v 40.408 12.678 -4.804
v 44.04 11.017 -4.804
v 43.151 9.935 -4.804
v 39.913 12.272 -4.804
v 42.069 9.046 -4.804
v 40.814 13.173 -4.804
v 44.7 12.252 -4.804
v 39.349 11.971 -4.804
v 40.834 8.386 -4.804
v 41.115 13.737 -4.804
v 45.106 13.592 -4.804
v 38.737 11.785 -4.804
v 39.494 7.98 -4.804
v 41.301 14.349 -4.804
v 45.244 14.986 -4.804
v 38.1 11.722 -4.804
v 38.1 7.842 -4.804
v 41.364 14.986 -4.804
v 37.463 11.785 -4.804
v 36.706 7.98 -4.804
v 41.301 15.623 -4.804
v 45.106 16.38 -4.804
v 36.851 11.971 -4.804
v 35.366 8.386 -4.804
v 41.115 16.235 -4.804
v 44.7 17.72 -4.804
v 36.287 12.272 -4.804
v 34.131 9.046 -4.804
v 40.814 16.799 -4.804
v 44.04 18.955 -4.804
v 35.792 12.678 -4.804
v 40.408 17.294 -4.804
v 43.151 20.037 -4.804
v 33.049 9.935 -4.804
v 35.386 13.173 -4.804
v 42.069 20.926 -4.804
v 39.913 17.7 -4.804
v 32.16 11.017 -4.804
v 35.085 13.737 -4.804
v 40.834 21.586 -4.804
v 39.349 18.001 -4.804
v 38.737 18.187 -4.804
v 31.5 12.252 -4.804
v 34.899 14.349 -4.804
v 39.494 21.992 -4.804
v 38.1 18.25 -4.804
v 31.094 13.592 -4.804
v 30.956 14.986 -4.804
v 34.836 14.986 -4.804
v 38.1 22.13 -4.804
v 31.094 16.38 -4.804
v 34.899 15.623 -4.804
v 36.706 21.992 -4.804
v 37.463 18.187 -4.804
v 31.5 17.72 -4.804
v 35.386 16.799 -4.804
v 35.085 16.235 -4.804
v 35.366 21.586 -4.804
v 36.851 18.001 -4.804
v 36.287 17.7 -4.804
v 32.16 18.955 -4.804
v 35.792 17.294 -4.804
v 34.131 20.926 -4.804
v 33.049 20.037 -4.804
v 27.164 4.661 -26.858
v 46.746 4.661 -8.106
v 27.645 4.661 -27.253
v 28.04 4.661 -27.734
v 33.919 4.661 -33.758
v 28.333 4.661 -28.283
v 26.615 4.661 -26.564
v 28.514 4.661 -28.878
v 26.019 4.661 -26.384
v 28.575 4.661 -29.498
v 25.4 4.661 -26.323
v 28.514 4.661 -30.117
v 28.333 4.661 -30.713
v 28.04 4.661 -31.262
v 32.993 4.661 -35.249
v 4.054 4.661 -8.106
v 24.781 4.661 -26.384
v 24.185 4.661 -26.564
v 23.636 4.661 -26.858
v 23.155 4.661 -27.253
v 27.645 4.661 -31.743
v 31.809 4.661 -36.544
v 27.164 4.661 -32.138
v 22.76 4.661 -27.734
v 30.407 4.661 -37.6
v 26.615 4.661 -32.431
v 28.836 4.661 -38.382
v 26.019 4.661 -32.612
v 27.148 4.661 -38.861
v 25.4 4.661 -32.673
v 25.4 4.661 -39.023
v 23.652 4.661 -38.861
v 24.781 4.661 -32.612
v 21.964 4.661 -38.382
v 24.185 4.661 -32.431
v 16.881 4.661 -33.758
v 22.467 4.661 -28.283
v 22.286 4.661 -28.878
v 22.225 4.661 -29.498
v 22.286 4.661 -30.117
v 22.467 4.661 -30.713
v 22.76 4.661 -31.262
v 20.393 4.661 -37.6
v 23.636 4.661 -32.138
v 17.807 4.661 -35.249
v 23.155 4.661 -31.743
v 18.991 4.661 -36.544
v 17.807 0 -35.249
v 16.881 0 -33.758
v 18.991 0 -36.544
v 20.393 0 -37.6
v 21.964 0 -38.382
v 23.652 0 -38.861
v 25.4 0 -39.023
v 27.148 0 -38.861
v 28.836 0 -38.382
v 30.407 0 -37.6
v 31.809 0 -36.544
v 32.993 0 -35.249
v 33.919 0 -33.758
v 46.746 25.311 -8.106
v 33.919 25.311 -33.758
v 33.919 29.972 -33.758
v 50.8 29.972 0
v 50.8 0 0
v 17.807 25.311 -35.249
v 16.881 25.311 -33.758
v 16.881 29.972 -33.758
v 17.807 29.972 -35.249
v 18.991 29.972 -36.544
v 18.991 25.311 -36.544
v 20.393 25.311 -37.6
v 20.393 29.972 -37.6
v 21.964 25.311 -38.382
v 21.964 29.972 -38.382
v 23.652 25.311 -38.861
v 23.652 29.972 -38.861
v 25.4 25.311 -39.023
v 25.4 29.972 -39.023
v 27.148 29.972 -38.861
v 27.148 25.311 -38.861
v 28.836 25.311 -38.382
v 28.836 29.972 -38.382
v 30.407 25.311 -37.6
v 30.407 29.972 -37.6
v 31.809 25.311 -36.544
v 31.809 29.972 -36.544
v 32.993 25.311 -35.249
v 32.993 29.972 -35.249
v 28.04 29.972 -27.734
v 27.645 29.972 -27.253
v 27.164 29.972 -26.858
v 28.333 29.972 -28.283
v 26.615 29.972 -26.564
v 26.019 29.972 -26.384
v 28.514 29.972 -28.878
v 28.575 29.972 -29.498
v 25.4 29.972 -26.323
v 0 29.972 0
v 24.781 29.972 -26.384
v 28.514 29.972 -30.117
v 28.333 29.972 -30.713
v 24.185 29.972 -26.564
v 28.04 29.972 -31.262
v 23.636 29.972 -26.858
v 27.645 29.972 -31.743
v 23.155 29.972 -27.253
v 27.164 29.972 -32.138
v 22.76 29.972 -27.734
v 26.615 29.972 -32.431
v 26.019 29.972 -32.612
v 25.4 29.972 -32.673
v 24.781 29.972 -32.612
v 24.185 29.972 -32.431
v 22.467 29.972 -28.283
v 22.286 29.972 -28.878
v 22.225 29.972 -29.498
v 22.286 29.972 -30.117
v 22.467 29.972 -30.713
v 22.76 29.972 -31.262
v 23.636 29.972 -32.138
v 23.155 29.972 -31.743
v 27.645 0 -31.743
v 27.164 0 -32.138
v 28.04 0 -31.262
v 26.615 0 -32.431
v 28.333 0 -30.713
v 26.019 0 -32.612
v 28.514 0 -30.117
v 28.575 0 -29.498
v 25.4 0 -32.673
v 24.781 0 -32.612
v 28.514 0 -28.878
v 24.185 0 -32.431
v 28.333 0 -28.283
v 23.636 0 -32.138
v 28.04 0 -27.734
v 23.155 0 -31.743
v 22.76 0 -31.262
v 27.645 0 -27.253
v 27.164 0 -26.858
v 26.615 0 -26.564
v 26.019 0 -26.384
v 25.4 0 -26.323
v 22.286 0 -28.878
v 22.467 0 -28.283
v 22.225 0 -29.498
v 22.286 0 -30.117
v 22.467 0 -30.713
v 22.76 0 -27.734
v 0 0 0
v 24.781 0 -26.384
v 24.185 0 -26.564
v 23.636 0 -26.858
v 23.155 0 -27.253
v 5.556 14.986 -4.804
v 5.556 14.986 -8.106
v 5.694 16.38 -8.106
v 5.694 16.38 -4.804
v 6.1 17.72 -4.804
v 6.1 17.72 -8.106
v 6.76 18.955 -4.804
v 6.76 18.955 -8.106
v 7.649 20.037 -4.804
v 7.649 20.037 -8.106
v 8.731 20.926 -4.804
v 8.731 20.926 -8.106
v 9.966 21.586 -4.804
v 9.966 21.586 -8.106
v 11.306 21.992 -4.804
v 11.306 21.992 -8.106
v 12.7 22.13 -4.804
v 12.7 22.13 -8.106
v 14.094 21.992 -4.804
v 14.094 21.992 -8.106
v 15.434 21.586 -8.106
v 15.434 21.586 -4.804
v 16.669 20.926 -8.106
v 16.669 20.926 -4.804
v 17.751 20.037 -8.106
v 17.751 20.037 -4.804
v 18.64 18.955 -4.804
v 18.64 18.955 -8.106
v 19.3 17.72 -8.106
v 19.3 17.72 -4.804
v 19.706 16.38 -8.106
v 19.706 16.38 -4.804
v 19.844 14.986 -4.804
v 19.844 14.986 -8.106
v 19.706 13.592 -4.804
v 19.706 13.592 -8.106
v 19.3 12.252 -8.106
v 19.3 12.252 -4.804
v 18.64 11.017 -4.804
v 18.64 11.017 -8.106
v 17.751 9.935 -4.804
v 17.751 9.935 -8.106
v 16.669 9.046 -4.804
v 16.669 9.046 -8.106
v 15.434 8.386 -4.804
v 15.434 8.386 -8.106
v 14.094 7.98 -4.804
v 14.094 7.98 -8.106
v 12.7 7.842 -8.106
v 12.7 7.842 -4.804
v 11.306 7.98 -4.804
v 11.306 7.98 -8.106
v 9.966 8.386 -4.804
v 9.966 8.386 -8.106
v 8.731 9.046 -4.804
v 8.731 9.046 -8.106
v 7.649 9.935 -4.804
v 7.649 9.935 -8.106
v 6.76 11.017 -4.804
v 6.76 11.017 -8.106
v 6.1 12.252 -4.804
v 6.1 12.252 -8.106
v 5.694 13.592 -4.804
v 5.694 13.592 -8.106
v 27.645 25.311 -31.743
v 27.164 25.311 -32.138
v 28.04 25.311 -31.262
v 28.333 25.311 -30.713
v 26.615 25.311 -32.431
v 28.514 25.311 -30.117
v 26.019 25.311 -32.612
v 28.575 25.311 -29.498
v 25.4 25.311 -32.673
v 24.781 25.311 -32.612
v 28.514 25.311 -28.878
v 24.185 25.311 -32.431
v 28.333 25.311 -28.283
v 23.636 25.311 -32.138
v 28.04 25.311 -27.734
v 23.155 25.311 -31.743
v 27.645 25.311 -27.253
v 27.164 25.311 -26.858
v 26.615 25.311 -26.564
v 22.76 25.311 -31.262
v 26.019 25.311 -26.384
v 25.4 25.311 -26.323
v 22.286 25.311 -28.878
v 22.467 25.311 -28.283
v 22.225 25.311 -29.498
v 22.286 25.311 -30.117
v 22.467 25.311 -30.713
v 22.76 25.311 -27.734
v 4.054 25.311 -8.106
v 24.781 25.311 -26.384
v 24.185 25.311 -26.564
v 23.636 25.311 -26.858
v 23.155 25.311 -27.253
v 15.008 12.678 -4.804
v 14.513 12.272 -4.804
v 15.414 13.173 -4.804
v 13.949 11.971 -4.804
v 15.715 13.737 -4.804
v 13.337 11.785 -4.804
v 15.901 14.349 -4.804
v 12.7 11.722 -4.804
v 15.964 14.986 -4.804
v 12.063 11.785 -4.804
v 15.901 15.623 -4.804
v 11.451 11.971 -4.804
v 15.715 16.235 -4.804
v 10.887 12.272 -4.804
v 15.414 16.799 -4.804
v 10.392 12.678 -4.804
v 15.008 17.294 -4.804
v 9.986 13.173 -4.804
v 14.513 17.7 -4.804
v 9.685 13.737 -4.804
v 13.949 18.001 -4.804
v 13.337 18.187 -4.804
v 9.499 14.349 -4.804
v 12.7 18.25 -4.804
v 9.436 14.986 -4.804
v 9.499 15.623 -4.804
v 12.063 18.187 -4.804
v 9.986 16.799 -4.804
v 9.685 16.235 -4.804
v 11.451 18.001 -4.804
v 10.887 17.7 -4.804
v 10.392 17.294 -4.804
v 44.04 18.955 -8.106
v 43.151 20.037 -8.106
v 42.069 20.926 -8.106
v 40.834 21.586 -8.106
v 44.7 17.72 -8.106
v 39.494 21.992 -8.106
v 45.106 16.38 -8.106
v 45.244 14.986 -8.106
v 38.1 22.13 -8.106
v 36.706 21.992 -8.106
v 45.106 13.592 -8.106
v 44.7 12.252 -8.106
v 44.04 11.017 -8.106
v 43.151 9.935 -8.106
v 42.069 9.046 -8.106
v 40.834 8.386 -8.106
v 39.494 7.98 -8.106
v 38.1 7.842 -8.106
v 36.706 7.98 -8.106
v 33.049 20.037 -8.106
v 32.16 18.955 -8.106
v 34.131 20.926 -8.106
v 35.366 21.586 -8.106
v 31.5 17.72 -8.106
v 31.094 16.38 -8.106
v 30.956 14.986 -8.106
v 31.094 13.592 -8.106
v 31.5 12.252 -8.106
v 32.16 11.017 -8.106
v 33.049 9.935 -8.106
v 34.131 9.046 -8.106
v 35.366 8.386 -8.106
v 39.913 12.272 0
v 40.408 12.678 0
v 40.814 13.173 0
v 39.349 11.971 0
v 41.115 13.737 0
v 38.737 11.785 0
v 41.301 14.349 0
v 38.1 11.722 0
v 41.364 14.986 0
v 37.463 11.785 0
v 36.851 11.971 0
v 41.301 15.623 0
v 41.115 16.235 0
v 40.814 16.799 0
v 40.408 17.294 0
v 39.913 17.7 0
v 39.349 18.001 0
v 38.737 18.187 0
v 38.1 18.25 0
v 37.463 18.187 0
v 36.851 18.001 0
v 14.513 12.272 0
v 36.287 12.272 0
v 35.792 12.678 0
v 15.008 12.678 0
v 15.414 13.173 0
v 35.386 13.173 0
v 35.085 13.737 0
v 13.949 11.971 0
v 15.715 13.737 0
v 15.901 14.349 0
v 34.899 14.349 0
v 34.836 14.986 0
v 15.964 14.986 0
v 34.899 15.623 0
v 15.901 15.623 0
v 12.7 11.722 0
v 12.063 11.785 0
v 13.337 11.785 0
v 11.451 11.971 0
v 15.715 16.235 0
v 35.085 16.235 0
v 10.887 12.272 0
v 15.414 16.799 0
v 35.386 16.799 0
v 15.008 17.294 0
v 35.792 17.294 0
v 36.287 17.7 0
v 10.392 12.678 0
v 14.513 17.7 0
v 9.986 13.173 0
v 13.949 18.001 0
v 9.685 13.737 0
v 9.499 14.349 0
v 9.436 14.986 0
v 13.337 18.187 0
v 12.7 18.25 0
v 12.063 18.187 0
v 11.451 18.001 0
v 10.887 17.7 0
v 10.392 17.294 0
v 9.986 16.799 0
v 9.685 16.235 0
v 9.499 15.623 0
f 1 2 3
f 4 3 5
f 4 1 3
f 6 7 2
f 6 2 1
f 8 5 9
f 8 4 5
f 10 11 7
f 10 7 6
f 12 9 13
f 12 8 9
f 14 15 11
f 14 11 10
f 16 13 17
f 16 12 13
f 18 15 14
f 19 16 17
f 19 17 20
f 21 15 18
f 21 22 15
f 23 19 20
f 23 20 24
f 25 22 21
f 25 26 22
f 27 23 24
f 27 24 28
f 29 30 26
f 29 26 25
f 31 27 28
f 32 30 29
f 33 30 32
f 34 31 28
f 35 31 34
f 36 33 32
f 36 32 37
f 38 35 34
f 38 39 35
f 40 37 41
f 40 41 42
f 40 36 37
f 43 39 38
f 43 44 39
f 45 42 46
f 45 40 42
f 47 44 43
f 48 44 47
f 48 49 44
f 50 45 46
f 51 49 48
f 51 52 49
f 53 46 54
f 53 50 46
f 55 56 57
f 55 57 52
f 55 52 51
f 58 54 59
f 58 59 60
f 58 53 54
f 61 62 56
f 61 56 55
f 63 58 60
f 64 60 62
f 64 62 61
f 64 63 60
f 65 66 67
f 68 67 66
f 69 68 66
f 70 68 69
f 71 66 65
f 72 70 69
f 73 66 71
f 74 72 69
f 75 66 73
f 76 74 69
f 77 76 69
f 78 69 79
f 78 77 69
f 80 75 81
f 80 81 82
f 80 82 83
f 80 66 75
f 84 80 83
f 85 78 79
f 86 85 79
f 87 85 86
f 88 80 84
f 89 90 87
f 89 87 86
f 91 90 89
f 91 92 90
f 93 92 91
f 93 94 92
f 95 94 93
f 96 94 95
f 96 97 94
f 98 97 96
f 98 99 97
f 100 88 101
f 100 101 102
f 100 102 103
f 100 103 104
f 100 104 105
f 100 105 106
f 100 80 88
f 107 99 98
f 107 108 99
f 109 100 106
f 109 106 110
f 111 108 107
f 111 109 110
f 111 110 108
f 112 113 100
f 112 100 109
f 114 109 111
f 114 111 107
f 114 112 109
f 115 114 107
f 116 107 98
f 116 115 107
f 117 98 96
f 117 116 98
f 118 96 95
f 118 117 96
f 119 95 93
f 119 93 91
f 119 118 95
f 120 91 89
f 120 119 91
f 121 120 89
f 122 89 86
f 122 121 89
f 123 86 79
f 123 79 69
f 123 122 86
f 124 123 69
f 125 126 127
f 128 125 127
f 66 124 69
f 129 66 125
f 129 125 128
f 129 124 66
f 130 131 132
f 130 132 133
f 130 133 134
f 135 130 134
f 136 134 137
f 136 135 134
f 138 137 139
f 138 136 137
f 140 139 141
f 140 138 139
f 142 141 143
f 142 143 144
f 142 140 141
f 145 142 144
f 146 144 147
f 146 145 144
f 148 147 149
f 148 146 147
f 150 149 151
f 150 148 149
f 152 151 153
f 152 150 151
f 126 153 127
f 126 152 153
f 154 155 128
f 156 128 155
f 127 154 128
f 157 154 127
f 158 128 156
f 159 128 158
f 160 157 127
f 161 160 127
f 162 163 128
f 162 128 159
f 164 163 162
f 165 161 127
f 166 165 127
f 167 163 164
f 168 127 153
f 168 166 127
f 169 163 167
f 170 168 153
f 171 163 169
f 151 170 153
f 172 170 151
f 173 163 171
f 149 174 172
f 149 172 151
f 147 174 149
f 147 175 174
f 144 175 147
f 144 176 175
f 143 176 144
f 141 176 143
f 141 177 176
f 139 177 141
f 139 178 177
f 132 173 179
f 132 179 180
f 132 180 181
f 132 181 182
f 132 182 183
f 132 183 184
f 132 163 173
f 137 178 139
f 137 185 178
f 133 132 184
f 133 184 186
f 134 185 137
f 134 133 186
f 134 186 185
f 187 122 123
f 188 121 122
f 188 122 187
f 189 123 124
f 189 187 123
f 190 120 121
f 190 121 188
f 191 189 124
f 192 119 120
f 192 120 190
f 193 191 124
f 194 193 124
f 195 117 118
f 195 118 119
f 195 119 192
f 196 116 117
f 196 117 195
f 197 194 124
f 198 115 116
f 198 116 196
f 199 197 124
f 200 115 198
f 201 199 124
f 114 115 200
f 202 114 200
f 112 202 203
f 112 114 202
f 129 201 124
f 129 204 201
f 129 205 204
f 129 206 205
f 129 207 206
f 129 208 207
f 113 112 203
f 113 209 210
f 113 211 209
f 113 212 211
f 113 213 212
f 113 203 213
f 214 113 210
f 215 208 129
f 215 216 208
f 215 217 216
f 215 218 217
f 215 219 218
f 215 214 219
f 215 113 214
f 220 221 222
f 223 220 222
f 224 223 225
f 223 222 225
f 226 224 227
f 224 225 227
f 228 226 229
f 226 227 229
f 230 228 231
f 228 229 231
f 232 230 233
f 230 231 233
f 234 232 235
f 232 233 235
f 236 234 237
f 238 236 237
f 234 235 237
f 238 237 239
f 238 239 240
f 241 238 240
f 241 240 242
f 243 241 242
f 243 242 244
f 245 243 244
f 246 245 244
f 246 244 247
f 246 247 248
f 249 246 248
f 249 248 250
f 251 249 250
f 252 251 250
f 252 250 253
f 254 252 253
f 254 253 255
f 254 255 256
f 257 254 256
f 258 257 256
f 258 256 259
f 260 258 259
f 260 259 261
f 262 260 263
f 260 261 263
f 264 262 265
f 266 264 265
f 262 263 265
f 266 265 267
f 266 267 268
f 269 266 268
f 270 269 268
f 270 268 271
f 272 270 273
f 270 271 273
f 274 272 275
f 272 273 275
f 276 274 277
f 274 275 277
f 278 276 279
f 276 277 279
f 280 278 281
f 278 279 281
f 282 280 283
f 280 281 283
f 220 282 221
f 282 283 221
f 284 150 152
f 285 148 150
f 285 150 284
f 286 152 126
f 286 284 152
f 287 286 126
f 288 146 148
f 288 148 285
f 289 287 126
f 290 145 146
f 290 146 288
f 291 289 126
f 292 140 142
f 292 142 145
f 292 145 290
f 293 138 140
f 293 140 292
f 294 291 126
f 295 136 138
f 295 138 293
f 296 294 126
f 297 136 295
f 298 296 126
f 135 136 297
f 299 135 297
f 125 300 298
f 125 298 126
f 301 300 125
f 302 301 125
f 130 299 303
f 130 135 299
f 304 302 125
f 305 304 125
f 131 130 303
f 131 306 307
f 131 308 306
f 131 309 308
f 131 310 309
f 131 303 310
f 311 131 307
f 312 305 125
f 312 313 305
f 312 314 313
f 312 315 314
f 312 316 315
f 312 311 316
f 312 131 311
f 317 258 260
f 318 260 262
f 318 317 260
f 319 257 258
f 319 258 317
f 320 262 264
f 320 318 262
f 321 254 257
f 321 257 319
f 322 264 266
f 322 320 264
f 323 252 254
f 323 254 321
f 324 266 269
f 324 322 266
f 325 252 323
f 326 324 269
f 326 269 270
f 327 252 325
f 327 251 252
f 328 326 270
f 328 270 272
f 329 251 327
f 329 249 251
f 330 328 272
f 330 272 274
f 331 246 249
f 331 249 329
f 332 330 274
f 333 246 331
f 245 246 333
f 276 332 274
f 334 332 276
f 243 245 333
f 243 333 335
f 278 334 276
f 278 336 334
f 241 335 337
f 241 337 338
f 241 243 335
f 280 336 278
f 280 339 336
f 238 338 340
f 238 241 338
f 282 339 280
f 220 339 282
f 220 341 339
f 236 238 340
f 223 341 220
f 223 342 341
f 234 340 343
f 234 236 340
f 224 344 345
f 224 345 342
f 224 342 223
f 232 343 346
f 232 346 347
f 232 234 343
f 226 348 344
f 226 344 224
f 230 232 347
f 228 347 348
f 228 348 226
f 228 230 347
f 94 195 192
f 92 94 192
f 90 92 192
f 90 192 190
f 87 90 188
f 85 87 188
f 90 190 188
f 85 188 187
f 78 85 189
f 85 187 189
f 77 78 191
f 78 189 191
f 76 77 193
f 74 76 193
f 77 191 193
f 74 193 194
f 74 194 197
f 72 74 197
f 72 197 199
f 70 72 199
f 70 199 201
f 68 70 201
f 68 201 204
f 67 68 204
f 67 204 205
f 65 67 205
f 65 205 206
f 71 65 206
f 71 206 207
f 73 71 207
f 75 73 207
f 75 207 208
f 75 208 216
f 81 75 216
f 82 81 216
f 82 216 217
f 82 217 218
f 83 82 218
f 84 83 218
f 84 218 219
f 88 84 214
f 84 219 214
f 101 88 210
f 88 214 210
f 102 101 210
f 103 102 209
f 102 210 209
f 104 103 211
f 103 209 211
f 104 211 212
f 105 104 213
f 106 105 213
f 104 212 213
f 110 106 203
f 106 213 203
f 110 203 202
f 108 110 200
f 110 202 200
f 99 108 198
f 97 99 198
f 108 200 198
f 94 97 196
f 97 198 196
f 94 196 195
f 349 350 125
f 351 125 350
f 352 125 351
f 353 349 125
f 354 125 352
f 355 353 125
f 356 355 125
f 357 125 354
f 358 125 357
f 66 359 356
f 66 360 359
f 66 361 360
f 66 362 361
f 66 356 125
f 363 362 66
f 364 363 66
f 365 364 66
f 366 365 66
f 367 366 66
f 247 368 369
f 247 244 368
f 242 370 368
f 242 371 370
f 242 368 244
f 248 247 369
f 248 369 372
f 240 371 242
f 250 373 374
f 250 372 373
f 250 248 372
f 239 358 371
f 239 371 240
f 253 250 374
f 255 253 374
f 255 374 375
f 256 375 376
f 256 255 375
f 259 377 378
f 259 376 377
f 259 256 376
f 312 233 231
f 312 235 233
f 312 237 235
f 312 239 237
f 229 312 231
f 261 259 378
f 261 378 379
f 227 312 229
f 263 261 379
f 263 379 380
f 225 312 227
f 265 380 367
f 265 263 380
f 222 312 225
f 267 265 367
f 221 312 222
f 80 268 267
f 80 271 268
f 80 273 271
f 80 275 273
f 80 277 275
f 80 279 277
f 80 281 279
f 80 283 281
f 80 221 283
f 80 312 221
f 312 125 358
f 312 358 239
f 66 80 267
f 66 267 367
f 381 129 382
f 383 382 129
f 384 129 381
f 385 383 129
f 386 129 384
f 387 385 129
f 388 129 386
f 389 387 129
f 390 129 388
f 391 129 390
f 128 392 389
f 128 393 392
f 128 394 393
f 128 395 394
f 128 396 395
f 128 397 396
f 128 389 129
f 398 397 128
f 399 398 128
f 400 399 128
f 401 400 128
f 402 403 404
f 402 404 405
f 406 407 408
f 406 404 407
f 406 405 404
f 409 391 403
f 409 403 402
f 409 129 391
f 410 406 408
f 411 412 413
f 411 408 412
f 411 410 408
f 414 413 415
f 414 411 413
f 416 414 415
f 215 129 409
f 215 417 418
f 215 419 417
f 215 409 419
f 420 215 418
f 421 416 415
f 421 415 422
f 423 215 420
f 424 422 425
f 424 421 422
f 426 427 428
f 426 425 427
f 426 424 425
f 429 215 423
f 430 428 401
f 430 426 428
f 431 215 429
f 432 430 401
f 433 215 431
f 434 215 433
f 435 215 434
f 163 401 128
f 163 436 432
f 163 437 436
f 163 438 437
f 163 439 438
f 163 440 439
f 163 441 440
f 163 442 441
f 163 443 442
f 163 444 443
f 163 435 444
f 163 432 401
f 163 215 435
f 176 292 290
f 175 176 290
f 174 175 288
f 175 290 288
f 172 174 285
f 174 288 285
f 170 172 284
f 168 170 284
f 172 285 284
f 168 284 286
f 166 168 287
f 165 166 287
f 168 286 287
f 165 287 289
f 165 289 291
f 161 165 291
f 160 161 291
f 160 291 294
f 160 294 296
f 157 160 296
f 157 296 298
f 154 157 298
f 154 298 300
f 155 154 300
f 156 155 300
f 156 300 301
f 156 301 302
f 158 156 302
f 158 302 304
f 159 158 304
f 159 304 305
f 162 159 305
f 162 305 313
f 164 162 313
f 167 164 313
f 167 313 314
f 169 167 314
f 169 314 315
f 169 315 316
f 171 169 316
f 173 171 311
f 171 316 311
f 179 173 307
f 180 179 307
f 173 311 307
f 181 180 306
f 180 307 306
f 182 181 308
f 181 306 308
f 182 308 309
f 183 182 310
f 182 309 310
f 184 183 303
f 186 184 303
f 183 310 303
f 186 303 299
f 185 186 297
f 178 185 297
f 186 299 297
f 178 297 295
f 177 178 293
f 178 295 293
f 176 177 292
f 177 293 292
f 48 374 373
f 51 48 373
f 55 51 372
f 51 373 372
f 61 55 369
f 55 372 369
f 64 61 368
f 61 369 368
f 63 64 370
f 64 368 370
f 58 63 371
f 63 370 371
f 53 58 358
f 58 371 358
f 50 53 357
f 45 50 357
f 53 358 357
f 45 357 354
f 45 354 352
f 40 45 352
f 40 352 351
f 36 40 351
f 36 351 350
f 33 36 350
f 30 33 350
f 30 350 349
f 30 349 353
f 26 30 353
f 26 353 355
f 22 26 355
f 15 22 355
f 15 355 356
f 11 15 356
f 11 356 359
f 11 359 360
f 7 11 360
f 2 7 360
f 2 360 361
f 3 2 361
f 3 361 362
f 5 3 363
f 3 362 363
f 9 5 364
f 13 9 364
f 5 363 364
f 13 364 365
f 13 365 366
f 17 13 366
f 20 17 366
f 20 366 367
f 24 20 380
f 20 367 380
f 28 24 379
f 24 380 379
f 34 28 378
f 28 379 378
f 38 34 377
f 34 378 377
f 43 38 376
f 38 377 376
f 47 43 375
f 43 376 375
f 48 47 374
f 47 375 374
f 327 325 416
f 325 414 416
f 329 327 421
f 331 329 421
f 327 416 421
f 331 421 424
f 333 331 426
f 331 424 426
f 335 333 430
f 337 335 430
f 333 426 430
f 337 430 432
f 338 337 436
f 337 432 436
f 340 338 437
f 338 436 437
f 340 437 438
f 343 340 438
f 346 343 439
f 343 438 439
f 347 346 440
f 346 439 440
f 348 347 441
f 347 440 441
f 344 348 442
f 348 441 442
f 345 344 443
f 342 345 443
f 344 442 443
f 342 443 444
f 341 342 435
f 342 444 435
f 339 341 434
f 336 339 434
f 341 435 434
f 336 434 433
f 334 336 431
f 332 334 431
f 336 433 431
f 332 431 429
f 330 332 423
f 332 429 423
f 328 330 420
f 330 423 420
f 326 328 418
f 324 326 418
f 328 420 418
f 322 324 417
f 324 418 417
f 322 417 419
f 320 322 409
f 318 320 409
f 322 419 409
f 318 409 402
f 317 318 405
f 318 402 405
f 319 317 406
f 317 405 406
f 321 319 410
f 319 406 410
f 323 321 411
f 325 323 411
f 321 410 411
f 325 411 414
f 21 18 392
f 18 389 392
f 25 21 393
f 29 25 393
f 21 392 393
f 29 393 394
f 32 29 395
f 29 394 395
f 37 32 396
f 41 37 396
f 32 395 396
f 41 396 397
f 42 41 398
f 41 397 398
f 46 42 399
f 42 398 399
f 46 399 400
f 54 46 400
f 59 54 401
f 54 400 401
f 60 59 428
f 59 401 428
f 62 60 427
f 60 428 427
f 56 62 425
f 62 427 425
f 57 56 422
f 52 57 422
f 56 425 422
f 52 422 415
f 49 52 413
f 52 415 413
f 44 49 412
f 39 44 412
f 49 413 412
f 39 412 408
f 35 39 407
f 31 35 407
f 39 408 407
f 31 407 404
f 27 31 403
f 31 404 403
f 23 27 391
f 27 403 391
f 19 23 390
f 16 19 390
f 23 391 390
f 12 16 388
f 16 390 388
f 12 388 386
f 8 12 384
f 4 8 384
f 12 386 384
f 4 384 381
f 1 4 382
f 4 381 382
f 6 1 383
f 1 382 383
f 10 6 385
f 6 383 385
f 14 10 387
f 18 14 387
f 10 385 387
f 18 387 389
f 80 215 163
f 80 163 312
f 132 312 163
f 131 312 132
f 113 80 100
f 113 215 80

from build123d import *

# Parameters (mm, degrees)
BOSS_EXTRUDE1_DEPTH                                  = 50.8
CBORE_FOR_1_4_BINDING_HEAD_MACHINE_SCREW_D           = 6.5278
CBORE_FOR_1_4_BINDING_HEAD_MACHINE_SCREW_CBORE_D     = 14.2875
CBORE_FOR_1_4_BINDING_HEAD_MACHINE_SCREW_CBORE_DEPTH = 3.302
CUT_EXTRUDE1_REACH                                   = 73.186
SKETCH4_R                                            = 3.175


with BuildPart() as part:
    # Sketch1 → Boss-Extrude1 (new body)
    with BuildSketch(Plane(origin=(0, 0, 0), x_dir=(0, 0, -1), z_dir=(1, 0, 0))):
        Polygon((0, 0), (0, 29.972), (39.856315031, 29.972), (39.856315031, 25.3111), (8.106315031, 25.3111), (8.106315031, 4.6609), (39.856315031, 4.6609), (39.856315031, 0), align=None)
    extrude(amount=BOSS_EXTRUDE1_DEPTH)

    # CBORE for 1/4 Binding Head Machine Screw1 (through all)
    with Locations(Plane(origin=(0, 0, -8.106315031), x_dir=(-1, 0, 0), z_dir=(0, 0, -1))):
        with Locations((-12.7, 14.986), (-38.1, 14.986)):
            CounterBoreHole(CBORE_FOR_1_4_BINDING_HEAD_MACHINE_SCREW_D / 2, CBORE_FOR_1_4_BINDING_HEAD_MACHINE_SCREW_CBORE_D / 2, CBORE_FOR_1_4_BINDING_HEAD_MACHINE_SCREW_CBORE_DEPTH)

    # Cut-Extrude1: up to this face of the body (flat: up to its plane)
    cut_extrude1_end = Plane(part.part.faces().sort_by_distance((25.4, 29.972, -19.928157515))[0])
    # Sketch4 → Cut-Extrude1 (cut, up to the picked face)
    with BuildSketch(Plane.XZ, mode=Mode.PRIVATE) as cut_extrude1_sk1:
        with Locations(Location((25.4, -29.497789369, 0), (0, 0, 270))):
            Circle(SKETCH4_R)
    cut_extrude1_tool1 = split(extrude(cut_extrude1_sk1.sketch, amount=-CUT_EXTRUDE1_REACH, mode=Mode.PRIVATE), bisect_by=cut_extrude1_end, keep=Keep.BOTH, mode=Mode.PRIVATE)
    # Sketch4 → Cut-Extrude1 (cut, up to the picked face)
    with BuildSketch(Plane.XZ, mode=Mode.PRIVATE) as cut_extrude1_sk2:
        with BuildLine():
            Line((0, 0), (16.880765903, -33.757868641))
            ThreePointArc((16.880765903, -33.757868641), (25.4, -39.022789369), (33.919234097, -33.757868641))
            Line((33.919234097, -33.757868641), (50.8, 0))
            Line((50.8, 0), (50.8, -39.856315031))
            Line((50.8, -39.856315031), (0, -39.856315031))
            Line((0, -39.856315031), (0, 0))
        make_face()
    cut_extrude1_tool2 = split(extrude(cut_extrude1_sk2.sketch, amount=-CUT_EXTRUDE1_REACH, mode=Mode.PRIVATE), bisect_by=cut_extrude1_end, keep=Keep.BOTH, mode=Mode.PRIVATE)
    add(cut_extrude1_tool1.solids().sort_by(Axis((25.4, 0, -29.497789), (0, 1, 0)))[0], mode=Mode.SUBTRACT)
    add(cut_extrude1_tool2.solids().sort_by(Axis((7.862872, 0, -17.167721), (0, 1, 0)))[0], mode=Mode.SUBTRACT)


solid = part.part
